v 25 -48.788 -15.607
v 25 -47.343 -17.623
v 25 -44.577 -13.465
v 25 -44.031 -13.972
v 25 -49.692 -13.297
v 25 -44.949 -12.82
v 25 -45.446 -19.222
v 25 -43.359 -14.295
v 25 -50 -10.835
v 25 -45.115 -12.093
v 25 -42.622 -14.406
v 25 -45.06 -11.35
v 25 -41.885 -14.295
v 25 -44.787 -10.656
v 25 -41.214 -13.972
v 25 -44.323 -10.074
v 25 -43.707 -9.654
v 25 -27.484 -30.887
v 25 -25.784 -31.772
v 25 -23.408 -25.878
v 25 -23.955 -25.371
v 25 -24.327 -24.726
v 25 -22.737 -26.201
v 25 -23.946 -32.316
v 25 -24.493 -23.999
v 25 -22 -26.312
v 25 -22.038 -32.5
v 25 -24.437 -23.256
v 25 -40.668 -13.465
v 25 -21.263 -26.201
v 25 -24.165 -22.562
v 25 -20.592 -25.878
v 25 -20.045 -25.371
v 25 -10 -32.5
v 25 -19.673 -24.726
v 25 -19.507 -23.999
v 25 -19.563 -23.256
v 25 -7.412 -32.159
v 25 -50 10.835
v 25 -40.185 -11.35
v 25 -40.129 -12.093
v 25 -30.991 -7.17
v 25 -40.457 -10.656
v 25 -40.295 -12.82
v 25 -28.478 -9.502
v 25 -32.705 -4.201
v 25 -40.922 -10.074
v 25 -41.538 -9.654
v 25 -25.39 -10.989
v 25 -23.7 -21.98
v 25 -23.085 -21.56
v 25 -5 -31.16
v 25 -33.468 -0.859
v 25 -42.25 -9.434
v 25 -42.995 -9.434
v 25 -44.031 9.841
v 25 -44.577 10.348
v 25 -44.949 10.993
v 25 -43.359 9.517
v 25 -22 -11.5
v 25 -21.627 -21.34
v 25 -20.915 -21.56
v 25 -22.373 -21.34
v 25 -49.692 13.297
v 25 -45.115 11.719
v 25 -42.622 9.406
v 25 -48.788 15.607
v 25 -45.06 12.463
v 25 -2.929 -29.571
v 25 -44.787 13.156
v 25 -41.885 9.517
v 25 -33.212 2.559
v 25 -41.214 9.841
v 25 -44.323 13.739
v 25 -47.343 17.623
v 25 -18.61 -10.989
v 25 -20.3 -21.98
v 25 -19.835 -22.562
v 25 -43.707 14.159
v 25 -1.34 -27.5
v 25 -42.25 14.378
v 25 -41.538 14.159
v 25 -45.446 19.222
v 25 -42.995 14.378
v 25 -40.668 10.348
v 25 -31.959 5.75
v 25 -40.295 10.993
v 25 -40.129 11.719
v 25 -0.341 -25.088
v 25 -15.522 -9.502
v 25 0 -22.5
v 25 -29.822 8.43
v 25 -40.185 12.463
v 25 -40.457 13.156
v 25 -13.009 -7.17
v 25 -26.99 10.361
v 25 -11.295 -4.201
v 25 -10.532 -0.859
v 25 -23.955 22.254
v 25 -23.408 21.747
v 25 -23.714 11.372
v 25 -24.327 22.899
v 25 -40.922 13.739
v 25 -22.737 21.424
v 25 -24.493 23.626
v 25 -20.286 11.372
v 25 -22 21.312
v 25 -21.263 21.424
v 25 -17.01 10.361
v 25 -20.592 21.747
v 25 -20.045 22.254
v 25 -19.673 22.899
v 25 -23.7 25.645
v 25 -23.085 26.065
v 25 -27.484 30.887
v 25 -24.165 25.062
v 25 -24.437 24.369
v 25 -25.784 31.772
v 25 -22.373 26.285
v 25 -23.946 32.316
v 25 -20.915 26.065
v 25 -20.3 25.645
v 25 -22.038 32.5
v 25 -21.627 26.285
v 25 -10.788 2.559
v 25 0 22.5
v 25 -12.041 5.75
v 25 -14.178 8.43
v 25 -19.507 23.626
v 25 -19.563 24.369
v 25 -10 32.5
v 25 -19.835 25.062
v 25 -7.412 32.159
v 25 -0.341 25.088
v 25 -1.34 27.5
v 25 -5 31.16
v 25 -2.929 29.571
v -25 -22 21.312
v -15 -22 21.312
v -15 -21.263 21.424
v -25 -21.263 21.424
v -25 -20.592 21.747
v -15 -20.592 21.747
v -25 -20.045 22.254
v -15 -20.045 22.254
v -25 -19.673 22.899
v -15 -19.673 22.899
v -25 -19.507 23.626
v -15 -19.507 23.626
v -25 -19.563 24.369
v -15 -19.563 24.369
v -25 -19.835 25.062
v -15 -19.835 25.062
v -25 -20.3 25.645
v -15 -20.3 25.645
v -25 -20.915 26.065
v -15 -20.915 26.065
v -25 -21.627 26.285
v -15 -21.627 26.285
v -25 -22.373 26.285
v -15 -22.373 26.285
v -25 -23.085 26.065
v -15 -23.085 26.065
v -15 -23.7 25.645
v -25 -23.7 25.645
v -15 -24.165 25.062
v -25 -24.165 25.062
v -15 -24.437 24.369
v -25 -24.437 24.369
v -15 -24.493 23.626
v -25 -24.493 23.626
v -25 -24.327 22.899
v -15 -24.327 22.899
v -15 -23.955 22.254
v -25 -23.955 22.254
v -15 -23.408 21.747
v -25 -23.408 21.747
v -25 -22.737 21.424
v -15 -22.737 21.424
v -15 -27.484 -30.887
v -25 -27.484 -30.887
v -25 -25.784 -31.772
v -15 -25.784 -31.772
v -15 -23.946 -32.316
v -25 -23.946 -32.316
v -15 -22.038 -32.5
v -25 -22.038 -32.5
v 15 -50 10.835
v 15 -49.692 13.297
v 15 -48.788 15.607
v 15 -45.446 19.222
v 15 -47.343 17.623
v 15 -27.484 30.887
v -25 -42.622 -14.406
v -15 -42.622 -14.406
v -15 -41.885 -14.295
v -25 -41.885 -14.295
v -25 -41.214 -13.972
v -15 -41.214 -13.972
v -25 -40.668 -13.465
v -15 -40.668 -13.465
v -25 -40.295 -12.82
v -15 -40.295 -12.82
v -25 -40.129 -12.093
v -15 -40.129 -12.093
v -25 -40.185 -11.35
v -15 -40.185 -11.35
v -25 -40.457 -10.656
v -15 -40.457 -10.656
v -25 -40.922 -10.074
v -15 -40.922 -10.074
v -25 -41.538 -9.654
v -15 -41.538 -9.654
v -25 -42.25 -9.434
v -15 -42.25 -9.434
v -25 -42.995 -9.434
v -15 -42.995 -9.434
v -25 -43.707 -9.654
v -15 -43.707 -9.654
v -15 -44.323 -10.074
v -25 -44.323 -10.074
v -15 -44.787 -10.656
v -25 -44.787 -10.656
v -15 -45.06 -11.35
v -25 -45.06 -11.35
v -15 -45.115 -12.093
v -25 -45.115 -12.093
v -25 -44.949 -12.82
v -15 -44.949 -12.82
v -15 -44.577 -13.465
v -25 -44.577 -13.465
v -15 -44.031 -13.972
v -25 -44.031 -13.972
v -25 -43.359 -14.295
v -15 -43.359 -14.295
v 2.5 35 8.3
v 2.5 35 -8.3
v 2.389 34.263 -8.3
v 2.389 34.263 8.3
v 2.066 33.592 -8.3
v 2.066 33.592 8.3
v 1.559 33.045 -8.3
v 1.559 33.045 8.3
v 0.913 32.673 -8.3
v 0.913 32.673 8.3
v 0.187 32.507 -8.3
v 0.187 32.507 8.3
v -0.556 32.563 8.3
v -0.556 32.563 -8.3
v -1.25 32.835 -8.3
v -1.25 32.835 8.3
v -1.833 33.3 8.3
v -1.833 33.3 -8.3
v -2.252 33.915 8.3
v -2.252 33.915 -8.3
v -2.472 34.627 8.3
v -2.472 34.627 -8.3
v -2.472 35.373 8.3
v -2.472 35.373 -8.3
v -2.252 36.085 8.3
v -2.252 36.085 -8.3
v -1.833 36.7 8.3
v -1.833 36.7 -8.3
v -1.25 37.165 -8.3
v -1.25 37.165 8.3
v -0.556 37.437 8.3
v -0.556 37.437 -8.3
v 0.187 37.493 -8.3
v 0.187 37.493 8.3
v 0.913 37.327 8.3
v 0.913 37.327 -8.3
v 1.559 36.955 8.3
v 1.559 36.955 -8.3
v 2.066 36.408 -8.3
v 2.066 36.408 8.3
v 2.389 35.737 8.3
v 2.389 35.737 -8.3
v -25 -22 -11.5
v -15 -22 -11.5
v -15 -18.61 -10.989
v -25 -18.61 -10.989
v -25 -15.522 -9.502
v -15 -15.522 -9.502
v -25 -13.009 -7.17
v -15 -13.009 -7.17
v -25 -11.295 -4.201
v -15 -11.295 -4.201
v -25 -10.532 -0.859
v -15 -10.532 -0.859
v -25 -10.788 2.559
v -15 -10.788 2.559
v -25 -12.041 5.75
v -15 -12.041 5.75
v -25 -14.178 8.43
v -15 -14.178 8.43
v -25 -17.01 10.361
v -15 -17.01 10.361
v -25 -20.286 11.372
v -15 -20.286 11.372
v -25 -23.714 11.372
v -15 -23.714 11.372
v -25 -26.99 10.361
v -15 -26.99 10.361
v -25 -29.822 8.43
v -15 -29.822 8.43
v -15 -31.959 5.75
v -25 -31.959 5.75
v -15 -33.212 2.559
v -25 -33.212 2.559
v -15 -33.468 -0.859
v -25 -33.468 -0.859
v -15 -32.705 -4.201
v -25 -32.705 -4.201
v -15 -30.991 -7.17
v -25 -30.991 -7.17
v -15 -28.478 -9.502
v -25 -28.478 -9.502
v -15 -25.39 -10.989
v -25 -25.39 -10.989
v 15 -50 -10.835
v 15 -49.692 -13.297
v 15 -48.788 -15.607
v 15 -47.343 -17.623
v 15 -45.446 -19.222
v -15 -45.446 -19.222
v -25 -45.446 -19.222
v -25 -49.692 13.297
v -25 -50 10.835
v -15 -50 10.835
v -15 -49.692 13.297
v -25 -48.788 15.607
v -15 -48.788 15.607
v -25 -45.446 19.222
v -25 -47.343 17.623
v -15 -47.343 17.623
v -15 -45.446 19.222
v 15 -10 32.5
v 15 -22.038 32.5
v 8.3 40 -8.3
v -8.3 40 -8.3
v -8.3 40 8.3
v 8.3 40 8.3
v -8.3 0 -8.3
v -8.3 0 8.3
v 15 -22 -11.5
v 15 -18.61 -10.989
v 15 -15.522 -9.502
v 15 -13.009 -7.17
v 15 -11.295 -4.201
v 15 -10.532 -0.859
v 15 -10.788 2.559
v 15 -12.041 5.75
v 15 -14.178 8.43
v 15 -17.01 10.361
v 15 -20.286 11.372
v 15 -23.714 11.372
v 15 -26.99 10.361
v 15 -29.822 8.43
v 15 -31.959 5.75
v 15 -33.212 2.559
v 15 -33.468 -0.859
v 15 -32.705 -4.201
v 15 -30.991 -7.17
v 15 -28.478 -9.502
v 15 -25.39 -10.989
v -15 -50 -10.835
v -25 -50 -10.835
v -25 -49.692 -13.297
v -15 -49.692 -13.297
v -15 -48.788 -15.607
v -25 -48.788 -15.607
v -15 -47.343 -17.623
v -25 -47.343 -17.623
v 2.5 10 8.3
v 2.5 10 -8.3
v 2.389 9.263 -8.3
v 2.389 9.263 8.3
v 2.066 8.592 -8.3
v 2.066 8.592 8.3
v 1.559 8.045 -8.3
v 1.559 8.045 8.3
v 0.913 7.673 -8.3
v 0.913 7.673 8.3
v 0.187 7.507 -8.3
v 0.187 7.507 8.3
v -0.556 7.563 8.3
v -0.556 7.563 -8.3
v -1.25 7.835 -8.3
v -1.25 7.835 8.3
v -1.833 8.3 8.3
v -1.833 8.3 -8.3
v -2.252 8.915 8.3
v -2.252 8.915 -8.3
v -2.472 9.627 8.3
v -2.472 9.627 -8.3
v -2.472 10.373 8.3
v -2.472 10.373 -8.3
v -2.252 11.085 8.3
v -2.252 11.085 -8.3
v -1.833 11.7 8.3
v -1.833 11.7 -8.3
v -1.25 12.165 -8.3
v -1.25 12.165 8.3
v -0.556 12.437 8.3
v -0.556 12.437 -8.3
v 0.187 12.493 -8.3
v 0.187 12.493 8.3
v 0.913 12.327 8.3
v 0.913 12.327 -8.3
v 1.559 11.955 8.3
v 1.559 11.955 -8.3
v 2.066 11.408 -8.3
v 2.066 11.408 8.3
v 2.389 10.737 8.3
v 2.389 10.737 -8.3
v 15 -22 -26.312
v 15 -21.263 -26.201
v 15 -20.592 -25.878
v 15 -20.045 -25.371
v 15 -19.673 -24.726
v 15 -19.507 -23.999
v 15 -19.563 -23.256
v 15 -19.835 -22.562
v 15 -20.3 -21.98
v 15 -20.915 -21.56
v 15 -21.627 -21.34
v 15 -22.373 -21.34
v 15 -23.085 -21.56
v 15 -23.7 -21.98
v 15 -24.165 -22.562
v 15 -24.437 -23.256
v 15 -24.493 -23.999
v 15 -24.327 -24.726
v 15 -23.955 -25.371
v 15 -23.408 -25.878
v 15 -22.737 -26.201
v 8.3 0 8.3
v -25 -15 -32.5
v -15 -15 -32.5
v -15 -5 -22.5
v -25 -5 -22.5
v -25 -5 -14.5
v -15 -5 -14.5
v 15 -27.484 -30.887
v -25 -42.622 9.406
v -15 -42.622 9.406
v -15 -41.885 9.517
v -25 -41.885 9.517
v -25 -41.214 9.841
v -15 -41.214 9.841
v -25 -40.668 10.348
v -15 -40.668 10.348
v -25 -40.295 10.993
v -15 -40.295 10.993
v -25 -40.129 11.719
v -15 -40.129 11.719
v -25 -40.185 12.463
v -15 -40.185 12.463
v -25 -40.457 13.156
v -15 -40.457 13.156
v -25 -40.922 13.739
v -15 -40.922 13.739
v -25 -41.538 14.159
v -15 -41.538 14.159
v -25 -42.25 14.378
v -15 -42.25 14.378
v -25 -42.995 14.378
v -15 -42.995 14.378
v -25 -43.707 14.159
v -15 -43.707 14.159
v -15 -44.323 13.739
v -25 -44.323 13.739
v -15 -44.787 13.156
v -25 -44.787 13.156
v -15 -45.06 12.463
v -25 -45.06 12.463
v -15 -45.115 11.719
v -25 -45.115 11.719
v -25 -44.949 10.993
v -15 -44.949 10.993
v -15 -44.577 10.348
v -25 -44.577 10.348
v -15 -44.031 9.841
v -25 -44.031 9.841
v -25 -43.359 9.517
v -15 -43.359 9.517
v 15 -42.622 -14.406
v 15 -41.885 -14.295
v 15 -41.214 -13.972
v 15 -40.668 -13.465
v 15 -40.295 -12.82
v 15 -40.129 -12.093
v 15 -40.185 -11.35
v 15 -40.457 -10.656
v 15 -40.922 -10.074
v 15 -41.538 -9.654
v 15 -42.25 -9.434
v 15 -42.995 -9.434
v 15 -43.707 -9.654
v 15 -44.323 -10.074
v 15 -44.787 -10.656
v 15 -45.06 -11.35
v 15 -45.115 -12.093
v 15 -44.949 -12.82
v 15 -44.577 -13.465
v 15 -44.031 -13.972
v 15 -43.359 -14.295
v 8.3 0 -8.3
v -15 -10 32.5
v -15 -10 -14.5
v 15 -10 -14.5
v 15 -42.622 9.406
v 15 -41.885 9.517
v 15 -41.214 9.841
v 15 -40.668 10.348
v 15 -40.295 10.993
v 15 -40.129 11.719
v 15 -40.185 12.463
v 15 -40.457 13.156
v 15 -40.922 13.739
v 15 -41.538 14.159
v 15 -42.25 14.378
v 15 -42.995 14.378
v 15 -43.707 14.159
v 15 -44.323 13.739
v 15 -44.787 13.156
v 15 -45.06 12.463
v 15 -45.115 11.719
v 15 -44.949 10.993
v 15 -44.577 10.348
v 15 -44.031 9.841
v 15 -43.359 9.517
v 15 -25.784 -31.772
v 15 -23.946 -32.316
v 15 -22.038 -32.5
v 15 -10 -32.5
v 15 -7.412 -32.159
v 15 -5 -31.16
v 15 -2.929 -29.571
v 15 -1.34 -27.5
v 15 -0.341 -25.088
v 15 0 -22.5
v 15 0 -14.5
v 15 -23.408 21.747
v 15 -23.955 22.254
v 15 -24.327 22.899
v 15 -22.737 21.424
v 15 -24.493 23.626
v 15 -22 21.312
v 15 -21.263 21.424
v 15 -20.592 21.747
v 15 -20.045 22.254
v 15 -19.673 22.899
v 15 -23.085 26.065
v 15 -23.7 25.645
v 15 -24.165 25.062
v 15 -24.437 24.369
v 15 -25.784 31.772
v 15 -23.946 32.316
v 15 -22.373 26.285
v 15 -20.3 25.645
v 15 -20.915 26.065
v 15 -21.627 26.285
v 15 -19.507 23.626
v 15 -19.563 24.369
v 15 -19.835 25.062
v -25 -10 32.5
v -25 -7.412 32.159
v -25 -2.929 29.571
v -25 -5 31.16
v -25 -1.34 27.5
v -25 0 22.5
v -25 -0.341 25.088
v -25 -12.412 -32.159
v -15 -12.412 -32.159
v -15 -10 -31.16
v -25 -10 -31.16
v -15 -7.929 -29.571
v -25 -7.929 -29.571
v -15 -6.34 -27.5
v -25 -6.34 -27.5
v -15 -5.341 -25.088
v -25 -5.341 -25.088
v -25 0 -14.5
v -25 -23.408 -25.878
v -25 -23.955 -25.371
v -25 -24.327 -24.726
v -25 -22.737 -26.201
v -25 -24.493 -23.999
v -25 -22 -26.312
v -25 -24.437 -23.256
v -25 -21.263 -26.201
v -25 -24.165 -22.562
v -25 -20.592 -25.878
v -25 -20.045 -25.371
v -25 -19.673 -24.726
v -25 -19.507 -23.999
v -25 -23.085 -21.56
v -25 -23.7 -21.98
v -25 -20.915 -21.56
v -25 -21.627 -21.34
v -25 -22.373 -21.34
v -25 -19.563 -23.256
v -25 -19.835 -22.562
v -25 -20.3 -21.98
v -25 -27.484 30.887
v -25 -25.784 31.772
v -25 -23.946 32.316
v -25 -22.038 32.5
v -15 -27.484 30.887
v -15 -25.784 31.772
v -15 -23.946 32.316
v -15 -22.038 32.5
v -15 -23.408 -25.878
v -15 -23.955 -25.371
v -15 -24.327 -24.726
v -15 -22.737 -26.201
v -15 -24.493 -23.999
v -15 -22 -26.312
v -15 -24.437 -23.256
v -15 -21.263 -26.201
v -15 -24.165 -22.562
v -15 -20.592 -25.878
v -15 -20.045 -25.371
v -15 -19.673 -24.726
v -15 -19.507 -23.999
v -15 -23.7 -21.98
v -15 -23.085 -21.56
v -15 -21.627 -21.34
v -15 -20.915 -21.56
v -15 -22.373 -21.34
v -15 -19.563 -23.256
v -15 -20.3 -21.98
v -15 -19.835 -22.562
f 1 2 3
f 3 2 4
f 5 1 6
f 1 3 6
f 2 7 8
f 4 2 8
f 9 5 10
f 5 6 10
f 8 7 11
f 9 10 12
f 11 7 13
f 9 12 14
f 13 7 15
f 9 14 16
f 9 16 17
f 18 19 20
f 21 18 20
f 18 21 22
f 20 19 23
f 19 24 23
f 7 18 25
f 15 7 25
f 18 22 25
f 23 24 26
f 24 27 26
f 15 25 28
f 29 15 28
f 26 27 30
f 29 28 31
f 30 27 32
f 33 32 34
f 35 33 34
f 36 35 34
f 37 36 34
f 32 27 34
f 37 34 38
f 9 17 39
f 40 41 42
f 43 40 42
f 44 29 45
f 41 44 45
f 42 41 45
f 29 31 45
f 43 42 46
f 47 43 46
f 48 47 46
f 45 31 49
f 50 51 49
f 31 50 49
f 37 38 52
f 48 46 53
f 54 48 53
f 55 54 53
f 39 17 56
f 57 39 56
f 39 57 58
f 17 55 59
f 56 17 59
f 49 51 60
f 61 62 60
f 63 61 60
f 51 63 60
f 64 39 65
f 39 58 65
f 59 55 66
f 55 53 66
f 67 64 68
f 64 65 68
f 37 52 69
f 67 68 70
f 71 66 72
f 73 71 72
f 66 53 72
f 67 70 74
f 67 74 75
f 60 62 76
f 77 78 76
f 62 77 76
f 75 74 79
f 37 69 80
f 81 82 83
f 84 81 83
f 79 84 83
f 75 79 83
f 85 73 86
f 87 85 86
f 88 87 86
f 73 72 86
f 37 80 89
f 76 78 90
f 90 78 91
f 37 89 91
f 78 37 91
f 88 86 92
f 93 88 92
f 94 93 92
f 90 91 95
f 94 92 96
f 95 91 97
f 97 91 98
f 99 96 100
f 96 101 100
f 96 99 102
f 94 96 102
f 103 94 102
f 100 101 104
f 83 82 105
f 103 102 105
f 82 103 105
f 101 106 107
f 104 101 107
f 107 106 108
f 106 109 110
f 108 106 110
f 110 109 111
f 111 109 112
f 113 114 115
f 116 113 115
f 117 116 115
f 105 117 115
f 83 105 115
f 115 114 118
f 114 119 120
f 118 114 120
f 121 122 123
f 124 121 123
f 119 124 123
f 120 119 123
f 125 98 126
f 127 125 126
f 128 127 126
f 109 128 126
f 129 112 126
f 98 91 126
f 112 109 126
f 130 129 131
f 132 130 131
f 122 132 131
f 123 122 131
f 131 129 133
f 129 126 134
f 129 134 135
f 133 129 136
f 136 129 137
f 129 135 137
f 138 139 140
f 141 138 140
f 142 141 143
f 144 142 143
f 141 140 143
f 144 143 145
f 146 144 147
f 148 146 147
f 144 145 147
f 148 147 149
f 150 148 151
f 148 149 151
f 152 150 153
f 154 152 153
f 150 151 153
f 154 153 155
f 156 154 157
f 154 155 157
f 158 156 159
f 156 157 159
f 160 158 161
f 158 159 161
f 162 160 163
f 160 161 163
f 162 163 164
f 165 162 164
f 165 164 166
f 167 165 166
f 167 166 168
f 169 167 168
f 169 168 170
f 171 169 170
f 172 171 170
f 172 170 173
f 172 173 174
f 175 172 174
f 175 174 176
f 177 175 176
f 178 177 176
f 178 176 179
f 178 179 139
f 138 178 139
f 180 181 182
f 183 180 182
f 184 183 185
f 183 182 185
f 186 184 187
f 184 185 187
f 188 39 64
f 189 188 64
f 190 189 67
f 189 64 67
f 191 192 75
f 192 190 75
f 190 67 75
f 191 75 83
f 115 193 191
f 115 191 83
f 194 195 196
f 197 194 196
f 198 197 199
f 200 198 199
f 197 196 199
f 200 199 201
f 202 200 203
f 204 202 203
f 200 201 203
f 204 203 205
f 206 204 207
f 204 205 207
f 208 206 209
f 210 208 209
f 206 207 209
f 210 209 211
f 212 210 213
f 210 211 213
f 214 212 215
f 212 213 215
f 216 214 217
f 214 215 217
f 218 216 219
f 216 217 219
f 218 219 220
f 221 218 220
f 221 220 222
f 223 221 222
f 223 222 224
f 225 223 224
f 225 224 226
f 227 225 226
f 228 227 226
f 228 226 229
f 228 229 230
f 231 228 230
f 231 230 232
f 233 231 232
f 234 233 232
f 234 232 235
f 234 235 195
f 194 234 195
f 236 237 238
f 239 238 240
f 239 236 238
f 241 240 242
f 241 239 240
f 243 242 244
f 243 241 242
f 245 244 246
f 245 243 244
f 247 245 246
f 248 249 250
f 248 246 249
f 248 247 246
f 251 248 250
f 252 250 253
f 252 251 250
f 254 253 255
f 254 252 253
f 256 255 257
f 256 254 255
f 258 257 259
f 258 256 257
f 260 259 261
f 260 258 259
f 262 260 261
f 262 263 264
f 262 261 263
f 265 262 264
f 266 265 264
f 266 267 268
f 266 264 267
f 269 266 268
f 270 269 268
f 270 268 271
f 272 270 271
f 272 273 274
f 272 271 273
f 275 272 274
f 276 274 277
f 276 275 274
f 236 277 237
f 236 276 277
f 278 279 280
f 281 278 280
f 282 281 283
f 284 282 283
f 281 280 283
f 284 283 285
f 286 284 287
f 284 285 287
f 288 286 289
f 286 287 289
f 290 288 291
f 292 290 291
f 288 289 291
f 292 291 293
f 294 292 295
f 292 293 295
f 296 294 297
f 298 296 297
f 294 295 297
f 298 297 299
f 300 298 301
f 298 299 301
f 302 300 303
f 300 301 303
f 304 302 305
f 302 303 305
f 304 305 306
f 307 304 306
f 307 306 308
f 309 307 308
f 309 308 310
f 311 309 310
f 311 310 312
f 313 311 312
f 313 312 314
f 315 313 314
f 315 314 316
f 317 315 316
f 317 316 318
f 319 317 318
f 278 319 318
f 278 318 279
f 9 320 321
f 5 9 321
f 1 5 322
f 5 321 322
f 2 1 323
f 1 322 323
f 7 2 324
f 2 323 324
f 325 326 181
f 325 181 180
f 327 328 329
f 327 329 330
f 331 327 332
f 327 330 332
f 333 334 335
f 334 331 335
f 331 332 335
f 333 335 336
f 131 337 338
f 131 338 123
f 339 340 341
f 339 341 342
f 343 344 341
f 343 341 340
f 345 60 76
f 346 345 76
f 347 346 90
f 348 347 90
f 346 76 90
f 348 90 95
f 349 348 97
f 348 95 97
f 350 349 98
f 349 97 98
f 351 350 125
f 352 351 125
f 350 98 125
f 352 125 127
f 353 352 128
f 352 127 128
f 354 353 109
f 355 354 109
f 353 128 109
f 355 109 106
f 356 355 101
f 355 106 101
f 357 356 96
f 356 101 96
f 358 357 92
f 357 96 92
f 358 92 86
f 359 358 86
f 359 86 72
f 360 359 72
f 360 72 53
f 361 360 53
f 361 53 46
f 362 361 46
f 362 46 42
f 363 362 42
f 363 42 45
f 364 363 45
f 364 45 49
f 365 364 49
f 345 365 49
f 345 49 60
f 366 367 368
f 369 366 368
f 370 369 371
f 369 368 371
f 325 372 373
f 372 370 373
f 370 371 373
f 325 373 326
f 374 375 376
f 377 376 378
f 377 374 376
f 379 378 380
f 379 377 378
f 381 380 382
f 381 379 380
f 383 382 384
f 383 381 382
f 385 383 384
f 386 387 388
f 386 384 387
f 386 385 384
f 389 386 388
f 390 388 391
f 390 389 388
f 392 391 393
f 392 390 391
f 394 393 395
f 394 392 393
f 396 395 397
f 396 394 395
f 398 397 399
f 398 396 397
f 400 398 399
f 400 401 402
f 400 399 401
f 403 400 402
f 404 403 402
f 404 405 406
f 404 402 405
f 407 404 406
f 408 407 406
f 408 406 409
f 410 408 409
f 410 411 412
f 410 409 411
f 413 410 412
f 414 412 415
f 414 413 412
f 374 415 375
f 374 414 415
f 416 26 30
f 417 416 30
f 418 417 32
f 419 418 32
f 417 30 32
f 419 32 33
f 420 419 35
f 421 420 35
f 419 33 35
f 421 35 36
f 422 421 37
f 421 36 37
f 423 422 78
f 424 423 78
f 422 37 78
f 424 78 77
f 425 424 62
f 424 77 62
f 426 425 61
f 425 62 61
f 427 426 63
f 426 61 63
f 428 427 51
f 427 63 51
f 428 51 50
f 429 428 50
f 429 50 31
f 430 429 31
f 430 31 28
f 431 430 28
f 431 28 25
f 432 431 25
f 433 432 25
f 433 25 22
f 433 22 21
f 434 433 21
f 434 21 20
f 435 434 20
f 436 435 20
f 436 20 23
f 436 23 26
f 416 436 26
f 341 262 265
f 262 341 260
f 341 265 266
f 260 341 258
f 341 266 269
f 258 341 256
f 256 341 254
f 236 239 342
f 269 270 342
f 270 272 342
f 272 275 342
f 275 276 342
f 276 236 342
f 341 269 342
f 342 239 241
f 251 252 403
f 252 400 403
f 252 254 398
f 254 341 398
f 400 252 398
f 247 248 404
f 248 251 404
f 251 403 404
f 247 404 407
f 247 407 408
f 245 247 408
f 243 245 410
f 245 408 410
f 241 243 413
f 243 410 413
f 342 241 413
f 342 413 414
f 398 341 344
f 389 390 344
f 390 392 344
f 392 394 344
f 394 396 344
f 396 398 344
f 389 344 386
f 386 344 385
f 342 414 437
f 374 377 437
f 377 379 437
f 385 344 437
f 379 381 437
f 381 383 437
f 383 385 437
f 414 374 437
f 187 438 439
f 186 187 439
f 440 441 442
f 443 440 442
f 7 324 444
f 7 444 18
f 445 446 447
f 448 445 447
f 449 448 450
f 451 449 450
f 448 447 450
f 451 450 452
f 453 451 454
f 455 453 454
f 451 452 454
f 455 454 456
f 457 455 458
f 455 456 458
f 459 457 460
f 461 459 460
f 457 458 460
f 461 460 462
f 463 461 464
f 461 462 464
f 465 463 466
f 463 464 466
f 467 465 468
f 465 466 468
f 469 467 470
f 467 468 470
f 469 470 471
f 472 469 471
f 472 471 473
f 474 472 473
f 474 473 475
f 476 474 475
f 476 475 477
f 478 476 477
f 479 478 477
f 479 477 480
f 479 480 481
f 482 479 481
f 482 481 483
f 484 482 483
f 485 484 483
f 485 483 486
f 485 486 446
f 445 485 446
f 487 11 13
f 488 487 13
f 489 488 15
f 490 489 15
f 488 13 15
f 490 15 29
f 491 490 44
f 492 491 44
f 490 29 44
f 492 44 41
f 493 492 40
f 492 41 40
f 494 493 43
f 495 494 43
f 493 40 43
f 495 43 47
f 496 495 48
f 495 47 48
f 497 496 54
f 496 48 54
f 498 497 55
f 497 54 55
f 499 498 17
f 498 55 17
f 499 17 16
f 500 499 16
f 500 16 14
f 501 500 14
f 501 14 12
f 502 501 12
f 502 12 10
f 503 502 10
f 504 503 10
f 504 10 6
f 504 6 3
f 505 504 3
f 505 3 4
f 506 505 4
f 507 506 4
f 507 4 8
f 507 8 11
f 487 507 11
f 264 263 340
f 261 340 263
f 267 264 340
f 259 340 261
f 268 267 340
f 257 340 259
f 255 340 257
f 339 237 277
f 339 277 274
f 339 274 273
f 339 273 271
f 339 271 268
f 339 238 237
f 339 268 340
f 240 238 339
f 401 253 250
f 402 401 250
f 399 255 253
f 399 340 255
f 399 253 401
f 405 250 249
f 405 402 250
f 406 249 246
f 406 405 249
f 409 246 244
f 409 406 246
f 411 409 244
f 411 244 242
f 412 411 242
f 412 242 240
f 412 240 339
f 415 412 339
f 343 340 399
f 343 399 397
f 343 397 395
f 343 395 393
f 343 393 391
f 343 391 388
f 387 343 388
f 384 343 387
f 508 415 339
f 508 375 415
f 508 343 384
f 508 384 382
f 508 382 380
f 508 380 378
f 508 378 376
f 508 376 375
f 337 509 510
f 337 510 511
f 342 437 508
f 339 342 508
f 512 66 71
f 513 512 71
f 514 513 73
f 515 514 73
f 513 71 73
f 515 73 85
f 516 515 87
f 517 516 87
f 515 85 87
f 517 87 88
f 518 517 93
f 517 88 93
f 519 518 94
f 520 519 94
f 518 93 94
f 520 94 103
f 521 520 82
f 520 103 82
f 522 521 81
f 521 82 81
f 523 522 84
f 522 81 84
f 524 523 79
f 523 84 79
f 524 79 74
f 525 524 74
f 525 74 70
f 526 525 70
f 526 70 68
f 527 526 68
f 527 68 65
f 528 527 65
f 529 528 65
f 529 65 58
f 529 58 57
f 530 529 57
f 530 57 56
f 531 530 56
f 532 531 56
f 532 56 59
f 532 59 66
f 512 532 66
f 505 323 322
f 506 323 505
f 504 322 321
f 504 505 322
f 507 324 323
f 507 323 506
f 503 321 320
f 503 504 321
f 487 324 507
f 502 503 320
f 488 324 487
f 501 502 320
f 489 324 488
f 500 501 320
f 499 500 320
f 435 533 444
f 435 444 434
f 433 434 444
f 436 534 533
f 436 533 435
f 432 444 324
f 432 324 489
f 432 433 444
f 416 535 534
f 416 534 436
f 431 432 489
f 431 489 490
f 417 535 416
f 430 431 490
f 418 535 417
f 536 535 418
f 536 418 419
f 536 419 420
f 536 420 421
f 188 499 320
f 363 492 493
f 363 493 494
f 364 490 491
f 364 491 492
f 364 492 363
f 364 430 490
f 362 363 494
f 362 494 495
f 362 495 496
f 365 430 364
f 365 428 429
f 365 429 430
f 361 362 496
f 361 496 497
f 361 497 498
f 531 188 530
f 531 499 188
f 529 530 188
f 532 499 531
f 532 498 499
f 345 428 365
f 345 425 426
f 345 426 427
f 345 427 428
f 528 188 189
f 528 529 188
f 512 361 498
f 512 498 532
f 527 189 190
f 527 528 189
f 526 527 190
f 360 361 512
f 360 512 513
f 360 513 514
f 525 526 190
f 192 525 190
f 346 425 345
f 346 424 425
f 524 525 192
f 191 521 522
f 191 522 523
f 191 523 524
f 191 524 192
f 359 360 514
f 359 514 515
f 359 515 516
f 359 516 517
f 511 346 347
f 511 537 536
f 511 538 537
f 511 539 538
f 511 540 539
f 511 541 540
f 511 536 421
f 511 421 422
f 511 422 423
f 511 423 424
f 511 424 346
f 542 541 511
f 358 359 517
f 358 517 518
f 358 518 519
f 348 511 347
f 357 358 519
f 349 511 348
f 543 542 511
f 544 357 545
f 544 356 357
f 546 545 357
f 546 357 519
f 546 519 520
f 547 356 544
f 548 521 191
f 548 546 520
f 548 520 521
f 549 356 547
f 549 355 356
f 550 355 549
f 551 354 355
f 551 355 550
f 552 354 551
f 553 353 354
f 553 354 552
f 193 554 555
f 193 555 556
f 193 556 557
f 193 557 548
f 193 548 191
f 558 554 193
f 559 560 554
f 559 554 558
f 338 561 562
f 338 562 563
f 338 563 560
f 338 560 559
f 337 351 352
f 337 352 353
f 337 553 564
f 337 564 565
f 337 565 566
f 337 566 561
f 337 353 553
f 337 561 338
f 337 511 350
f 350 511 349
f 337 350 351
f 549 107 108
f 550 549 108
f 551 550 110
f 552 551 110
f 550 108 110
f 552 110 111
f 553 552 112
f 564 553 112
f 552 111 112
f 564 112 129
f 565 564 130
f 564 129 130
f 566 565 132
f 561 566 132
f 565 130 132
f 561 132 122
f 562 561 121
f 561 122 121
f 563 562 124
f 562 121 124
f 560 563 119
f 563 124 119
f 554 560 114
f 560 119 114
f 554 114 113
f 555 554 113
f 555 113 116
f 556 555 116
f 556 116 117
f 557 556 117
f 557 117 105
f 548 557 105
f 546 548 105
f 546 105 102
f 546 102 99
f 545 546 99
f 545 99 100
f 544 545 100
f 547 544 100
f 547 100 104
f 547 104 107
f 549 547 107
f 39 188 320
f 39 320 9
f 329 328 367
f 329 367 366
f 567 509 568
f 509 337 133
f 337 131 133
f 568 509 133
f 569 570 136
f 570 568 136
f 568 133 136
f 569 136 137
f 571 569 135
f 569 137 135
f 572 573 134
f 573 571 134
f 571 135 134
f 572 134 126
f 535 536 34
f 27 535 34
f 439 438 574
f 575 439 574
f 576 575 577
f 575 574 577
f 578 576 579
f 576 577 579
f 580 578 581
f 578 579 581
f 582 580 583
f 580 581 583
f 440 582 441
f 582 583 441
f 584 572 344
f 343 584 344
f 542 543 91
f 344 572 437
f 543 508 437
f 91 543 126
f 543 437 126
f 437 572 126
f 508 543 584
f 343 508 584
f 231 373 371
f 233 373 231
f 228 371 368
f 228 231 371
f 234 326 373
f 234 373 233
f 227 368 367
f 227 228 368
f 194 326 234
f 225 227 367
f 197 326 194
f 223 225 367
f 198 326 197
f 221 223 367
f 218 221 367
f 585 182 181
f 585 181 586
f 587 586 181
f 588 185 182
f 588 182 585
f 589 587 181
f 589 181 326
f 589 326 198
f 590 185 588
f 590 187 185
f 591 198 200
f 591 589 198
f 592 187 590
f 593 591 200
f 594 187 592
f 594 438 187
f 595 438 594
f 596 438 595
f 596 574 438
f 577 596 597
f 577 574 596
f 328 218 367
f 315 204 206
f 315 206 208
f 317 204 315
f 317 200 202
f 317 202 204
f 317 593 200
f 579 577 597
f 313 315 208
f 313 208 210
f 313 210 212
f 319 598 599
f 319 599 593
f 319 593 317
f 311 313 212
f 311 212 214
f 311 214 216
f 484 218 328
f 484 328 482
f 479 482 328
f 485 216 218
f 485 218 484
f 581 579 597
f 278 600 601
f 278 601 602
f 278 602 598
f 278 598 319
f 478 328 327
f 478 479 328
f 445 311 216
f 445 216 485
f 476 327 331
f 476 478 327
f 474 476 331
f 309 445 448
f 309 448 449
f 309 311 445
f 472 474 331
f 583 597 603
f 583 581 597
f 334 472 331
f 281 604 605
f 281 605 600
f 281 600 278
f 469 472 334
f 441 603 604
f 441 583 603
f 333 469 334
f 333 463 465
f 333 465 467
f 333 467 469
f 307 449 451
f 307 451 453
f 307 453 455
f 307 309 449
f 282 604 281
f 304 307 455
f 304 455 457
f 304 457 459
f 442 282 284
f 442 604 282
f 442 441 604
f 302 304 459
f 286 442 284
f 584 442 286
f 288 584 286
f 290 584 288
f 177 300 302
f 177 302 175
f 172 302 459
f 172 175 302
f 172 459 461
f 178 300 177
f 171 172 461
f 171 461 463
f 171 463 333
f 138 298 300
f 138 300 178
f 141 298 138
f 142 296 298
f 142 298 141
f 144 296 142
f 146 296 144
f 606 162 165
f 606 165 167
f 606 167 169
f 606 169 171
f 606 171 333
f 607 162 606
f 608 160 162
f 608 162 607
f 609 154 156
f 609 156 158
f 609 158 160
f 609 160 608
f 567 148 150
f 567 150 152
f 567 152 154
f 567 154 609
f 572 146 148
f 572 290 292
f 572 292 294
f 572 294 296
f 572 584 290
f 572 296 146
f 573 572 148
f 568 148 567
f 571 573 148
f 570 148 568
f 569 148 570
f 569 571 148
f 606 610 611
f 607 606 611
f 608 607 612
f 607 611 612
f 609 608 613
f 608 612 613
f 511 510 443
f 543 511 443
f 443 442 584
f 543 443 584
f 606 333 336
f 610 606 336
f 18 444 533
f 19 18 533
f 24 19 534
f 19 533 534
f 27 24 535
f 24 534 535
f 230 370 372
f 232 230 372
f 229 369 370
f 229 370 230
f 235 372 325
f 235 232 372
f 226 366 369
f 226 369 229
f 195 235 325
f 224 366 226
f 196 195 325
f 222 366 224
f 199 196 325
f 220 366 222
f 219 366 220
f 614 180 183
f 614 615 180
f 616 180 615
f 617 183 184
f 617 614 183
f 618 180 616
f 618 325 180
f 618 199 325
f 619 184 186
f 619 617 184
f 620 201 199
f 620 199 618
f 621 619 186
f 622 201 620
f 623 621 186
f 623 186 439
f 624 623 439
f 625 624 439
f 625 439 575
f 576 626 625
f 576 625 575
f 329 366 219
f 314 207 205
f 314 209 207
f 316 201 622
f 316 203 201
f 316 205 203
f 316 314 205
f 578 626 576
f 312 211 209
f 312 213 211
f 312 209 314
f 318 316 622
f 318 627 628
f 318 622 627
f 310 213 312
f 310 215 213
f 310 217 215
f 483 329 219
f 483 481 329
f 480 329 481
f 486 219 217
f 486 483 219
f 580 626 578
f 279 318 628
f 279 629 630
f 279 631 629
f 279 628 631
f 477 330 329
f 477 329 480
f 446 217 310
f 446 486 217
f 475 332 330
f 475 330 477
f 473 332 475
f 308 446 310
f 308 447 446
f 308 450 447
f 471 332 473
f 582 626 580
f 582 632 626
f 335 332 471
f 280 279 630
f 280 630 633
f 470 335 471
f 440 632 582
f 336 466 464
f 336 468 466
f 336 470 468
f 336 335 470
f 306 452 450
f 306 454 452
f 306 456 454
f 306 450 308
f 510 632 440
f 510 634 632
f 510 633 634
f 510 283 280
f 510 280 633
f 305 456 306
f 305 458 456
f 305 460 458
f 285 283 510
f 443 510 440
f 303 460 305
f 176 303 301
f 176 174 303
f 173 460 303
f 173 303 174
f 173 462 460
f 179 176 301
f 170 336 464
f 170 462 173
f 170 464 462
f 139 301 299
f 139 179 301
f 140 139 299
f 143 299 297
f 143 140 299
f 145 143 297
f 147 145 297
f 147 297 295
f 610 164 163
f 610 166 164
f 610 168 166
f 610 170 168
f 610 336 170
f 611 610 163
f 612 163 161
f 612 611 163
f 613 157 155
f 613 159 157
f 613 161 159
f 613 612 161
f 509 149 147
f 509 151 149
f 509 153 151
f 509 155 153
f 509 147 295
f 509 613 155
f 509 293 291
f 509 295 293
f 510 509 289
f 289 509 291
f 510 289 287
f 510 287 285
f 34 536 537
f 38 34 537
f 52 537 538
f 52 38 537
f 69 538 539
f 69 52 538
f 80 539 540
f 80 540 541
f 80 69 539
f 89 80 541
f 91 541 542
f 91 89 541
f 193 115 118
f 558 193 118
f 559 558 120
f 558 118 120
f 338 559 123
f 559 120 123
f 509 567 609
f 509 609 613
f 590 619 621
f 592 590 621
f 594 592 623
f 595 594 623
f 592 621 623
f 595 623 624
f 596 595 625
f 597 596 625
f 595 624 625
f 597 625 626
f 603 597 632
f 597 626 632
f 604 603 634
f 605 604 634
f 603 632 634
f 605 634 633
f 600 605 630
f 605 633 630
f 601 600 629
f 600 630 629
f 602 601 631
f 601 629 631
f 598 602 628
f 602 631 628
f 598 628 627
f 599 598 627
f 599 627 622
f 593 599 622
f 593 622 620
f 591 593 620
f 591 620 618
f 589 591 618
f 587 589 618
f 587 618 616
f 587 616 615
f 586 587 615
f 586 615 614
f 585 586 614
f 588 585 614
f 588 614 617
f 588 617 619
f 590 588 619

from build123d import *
from OCP.BRepFilletAPI import BRepFilletAPI_MakeChamfer

# Parameters (mm, degrees)
ESBO_O1_W                = 16.6
ESBO_O1_H                = 16.6
RESSALTO_EXTRUS_O1_DEPTH = 40
ESBO_O2_W                = 50
ESBO_O2_H                = 65
RESSALTO_EXTRUS_O2_DEPTH = 50
ESBO_O3_W                = 30
ESBO_O3_H                = 40
CORTE_EXTRUS_O1_DEPTH    = 86.732140997
ESBO_O4_R                = 11.5
ESBO_O4_R_2              = 2.5
CORTE_EXTRUS_O2_DEPTH    = 78.821912081
ESBO_O5_W                = 18
ESBO_O5_H                = 5
CORTE_EXTRUS_O3_DEPTH    = 10
CHANFRO1_SIZE            = 25
CHANFRO1_SIZE2           = 16.23518983
FILETE2_R                = 10
ESBO_O8_W                = 18
ESBO_O8_H                = 5
CORTE_EXTRUS_O5_DEPTH    = 30
FILETE4_R                = 10
ESBO_O9_R                = 2.5
CORTE_EXTRUS_O7_DEPTH    = 70.207225056


with BuildPart() as part:
    # Esboço1 → Ressalto-extrusão1 (new body)
    with BuildSketch(Plane(origin=(0, 0, 0), x_dir=(1, 0, 0), z_dir=(0, 1, 0))):
        Rectangle(ESBO_O1_W, ESBO_O1_H)
    extrude(amount=RESSALTO_EXTRUS_O1_DEPTH)

    # Esboço2 → Ressalto-extrusão2 (add)
    with BuildSketch(Plane.XZ):
        Rectangle(ESBO_O2_W, ESBO_O2_H)
    extrude(amount=RESSALTO_EXTRUS_O2_DEPTH)

    # Esboço3 → Corte-extrusão1 (cut, through all)
    with BuildSketch(Plane.XY.offset(32.5)):
        with Locations((0, -30)):
            Rectangle(ESBO_O3_W, ESBO_O3_H)
    extrude(amount=-CORTE_EXTRUS_O1_DEPTH, mode=Mode.SUBTRACT)

    # Esboço4 → Corte-extrusão2 (cut, through all)
    with BuildSketch(Plane(origin=(25, 0, 0), x_dir=(0, 0, -1), z_dir=(1, 0, 0))):
        with Locations((0, -22)):
            Circle(ESBO_O4_R)
        with Locations((-23.8125, -22)):
            Circle(ESBO_O4_R_2)
        with Locations((23.8125, -22)):
            Circle(ESBO_O4_R_2)
        with Locations((-11.90625, -42.622229928)):
            Circle(ESBO_O4_R_2)
        with Locations((11.90625, -42.622229928)):
            Circle(ESBO_O4_R_2)
    extrude(amount=-CORTE_EXTRUS_O2_DEPTH, mode=Mode.SUBTRACT)

    # Esboço5 → Corte-extrusão3 (cut)
    with BuildSketch(Plane.ZY.offset(25)):
        with Locations((-23.5, -2.5)):
            Rectangle(ESBO_O5_W, ESBO_O5_H)
    extrude(amount=-CORTE_EXTRUS_O3_DEPTH, mode=Mode.SUBTRACT)

    # Chanfro1: one chamfer whose edges measure the first distance from different faces: ONE call of the kernel's chamfer builder (chamfer() names one face for all edges)
    chanfro1_edges_1 = [part.edges().sort_by_distance(p)[0] for p in [
        (20, -50, 32.5),
        (-20, -50, 32.5),
    ]]
    chanfro1_side_1 = [part.faces().sort_by_distance(p)[0] for p in [
        (0, -0.707106781, 32.5),
    ]]
    chanfro1_edges_2 = [part.edges().sort_by_distance(p)[0] for p in [
        (-20, -50, -32.5),
        (20, -50, -32.5),
    ]]
    chanfro1_side_2 = [part.faces().sort_by_distance(p)[0] for p in [
        (5, -0.707106781, -32.5),
    ]]
    chanfro1 = BRepFilletAPI_MakeChamfer(part.part.solid().wrapped)
    for e in chanfro1_edges_1:
        chanfro1.Add(CHANFRO1_SIZE, CHANFRO1_SIZE2, e.wrapped, chanfro1_side_1[0].wrapped)  # the first distance lies on this face
    for e in chanfro1_edges_2:
        chanfro1.Add(CHANFRO1_SIZE, CHANFRO1_SIZE2, e.wrapped, chanfro1_side_2[0].wrapped)  # the first distance lies on this face
    add(Compound.cast(chanfro1.Shape()), mode=Mode.REPLACE)

    # Filete2
    # the kernel refuses this fillet: 10 mm, written as the material it takes off along each edge
    with BuildSketch(Plane(origin=(7.594662626, -25, -32.5), x_dir=(0, 1, 0), z_dir=(1, 0, 0)), Plane(origin=(-32.405337374, -25, -32.5), x_dir=(0, 1, 0), z_dir=(1, 0, 0)), Plane(origin=(32.405337374, -25, 32.5), x_dir=(0, 1, 0), z_dir=(-1, 0, 0)), Plane(origin=(-7.594662626, -25, 32.5), x_dir=(0, 1, 0), z_dir=(-1, 0, 0))) as filete2_piece_1:
        with BuildLine():
            CenterArc((FILETE2_R * 0.296213494962, FILETE2_R), FILETE2_R, 237, 33)
            Line((-FILETE2_R * 0.248425540053, FILETE2_R * 0.161329432055), (0, 0))
            Line((0, 0), (FILETE2_R * 0.296213494962, 0))
        make_face()
    extrude(amount=24.810674748, mode=Mode.SUBTRACT)
    with BuildSketch(Plane(origin=(1.426107509, -50, -16.26481017), x_dir=(0, 0.8386705679454236, -0.5446390350150278), z_dir=(1, 0, 0)), Plane(origin=(-1.426107509, -50, 16.26481017), x_dir=(0, 0.8386705679454233, 0.5446390350150284), z_dir=(-1, 0, 0)), Plane(origin=(-38.573892491, -50, -16.26481017), x_dir=(0, 0.8386705679454236, -0.5446390350150278), z_dir=(1, 0, 0))) as filete2_piece_2:
        with BuildLine():
            CenterArc((FILETE2_R * 0.542955699638, FILETE2_R), FILETE2_R, 213, 57)
            Line((-FILETE2_R * 0.295714868307, FILETE2_R * 0.455360964985), (0, 0))
            Line((0, 0), (FILETE2_R * 0.542955699638, 0))
        make_face()
    extrude(amount=37.147784982, mode=Mode.SUBTRACT)
    with BuildSketch(Plane(origin=(38.573892491, -50, 16.26481017), x_dir=(0, 0, -1), z_dir=(-1, 0, 0))) as filete2_piece_3:
        with BuildLine():
            CenterArc((FILETE2_R * 0.542955699638, -FILETE2_R), FILETE2_R, 90, 57)
            Line((-FILETE2_R * 0.295714868307, -FILETE2_R * 0.455360964985), (0, 0))
            Line((0, 0), (FILETE2_R * 0.542955699638, 0))
        make_face()
    extrude(amount=37.147784982, mode=Mode.SUBTRACT)
    with BuildSketch(Plane(origin=(50, 0, 32.5), x_dir=(0, 0, -1), z_dir=(-1, 0, 0))) as filete2_piece_4:
        with BuildLine():
            CenterArc((FILETE2_R, FILETE2_R), FILETE2_R, 180, 90)
            Line((0, FILETE2_R), (0, 0))
            Line((0, 0), (FILETE2_R, 0))
        make_face()
    extrude(amount=100, mode=Mode.SUBTRACT)
    with BuildSketch(Plane(origin=(-50, -5, -32.5), x_dir=(0, -1, 0), z_dir=(1, 0, 0))) as filete2_piece_5:
        with BuildLine():
            CenterArc((FILETE2_R, -FILETE2_R), FILETE2_R, 90, 90)
            Line((0, -FILETE2_R), (0, 0))
            Line((0, 0), (FILETE2_R, 0))
        make_face()
    extrude(amount=35, mode=Mode.SUBTRACT)

    # Esboço8 → Corte-extrusão5 (cut)
    with BuildSketch(Plane.ZY.offset(15)):
        with Locations((-23.5, -2.5)):
            Rectangle(ESBO_O8_W, ESBO_O8_H)
        with Locations((-23.5, -7.5)):
            Rectangle(ESBO_O8_W, ESBO_O8_H)
    extrude(amount=-CORTE_EXTRUS_O5_DEPTH, mode=Mode.SUBTRACT)

    # Filete4
    filete4_edges = [part.edges().sort_by_distance(p)[0] for p in [
        (20, 0, -32.5),
    ]]
    fillet(filete4_edges, radius=FILETE4_R)

    # Esboço9 → Corte-extrusão7 (cut, through all)
    with BuildSketch(Plane(origin=(0, 0, 8.3), x_dir=(-1, 0, 0), z_dir=(0, 0, -1))):
        with Locations(Location((0, 10, 0), (0, 0, 180))):
            Circle(ESBO_O9_R)
        with Locations(Location((0, 35, 0), (0, 0, 180))):
            Circle(ESBO_O9_R)
    extrude(amount=CORTE_EXTRUS_O7_DEPTH, mode=Mode.SUBTRACT)


solid = part.part
